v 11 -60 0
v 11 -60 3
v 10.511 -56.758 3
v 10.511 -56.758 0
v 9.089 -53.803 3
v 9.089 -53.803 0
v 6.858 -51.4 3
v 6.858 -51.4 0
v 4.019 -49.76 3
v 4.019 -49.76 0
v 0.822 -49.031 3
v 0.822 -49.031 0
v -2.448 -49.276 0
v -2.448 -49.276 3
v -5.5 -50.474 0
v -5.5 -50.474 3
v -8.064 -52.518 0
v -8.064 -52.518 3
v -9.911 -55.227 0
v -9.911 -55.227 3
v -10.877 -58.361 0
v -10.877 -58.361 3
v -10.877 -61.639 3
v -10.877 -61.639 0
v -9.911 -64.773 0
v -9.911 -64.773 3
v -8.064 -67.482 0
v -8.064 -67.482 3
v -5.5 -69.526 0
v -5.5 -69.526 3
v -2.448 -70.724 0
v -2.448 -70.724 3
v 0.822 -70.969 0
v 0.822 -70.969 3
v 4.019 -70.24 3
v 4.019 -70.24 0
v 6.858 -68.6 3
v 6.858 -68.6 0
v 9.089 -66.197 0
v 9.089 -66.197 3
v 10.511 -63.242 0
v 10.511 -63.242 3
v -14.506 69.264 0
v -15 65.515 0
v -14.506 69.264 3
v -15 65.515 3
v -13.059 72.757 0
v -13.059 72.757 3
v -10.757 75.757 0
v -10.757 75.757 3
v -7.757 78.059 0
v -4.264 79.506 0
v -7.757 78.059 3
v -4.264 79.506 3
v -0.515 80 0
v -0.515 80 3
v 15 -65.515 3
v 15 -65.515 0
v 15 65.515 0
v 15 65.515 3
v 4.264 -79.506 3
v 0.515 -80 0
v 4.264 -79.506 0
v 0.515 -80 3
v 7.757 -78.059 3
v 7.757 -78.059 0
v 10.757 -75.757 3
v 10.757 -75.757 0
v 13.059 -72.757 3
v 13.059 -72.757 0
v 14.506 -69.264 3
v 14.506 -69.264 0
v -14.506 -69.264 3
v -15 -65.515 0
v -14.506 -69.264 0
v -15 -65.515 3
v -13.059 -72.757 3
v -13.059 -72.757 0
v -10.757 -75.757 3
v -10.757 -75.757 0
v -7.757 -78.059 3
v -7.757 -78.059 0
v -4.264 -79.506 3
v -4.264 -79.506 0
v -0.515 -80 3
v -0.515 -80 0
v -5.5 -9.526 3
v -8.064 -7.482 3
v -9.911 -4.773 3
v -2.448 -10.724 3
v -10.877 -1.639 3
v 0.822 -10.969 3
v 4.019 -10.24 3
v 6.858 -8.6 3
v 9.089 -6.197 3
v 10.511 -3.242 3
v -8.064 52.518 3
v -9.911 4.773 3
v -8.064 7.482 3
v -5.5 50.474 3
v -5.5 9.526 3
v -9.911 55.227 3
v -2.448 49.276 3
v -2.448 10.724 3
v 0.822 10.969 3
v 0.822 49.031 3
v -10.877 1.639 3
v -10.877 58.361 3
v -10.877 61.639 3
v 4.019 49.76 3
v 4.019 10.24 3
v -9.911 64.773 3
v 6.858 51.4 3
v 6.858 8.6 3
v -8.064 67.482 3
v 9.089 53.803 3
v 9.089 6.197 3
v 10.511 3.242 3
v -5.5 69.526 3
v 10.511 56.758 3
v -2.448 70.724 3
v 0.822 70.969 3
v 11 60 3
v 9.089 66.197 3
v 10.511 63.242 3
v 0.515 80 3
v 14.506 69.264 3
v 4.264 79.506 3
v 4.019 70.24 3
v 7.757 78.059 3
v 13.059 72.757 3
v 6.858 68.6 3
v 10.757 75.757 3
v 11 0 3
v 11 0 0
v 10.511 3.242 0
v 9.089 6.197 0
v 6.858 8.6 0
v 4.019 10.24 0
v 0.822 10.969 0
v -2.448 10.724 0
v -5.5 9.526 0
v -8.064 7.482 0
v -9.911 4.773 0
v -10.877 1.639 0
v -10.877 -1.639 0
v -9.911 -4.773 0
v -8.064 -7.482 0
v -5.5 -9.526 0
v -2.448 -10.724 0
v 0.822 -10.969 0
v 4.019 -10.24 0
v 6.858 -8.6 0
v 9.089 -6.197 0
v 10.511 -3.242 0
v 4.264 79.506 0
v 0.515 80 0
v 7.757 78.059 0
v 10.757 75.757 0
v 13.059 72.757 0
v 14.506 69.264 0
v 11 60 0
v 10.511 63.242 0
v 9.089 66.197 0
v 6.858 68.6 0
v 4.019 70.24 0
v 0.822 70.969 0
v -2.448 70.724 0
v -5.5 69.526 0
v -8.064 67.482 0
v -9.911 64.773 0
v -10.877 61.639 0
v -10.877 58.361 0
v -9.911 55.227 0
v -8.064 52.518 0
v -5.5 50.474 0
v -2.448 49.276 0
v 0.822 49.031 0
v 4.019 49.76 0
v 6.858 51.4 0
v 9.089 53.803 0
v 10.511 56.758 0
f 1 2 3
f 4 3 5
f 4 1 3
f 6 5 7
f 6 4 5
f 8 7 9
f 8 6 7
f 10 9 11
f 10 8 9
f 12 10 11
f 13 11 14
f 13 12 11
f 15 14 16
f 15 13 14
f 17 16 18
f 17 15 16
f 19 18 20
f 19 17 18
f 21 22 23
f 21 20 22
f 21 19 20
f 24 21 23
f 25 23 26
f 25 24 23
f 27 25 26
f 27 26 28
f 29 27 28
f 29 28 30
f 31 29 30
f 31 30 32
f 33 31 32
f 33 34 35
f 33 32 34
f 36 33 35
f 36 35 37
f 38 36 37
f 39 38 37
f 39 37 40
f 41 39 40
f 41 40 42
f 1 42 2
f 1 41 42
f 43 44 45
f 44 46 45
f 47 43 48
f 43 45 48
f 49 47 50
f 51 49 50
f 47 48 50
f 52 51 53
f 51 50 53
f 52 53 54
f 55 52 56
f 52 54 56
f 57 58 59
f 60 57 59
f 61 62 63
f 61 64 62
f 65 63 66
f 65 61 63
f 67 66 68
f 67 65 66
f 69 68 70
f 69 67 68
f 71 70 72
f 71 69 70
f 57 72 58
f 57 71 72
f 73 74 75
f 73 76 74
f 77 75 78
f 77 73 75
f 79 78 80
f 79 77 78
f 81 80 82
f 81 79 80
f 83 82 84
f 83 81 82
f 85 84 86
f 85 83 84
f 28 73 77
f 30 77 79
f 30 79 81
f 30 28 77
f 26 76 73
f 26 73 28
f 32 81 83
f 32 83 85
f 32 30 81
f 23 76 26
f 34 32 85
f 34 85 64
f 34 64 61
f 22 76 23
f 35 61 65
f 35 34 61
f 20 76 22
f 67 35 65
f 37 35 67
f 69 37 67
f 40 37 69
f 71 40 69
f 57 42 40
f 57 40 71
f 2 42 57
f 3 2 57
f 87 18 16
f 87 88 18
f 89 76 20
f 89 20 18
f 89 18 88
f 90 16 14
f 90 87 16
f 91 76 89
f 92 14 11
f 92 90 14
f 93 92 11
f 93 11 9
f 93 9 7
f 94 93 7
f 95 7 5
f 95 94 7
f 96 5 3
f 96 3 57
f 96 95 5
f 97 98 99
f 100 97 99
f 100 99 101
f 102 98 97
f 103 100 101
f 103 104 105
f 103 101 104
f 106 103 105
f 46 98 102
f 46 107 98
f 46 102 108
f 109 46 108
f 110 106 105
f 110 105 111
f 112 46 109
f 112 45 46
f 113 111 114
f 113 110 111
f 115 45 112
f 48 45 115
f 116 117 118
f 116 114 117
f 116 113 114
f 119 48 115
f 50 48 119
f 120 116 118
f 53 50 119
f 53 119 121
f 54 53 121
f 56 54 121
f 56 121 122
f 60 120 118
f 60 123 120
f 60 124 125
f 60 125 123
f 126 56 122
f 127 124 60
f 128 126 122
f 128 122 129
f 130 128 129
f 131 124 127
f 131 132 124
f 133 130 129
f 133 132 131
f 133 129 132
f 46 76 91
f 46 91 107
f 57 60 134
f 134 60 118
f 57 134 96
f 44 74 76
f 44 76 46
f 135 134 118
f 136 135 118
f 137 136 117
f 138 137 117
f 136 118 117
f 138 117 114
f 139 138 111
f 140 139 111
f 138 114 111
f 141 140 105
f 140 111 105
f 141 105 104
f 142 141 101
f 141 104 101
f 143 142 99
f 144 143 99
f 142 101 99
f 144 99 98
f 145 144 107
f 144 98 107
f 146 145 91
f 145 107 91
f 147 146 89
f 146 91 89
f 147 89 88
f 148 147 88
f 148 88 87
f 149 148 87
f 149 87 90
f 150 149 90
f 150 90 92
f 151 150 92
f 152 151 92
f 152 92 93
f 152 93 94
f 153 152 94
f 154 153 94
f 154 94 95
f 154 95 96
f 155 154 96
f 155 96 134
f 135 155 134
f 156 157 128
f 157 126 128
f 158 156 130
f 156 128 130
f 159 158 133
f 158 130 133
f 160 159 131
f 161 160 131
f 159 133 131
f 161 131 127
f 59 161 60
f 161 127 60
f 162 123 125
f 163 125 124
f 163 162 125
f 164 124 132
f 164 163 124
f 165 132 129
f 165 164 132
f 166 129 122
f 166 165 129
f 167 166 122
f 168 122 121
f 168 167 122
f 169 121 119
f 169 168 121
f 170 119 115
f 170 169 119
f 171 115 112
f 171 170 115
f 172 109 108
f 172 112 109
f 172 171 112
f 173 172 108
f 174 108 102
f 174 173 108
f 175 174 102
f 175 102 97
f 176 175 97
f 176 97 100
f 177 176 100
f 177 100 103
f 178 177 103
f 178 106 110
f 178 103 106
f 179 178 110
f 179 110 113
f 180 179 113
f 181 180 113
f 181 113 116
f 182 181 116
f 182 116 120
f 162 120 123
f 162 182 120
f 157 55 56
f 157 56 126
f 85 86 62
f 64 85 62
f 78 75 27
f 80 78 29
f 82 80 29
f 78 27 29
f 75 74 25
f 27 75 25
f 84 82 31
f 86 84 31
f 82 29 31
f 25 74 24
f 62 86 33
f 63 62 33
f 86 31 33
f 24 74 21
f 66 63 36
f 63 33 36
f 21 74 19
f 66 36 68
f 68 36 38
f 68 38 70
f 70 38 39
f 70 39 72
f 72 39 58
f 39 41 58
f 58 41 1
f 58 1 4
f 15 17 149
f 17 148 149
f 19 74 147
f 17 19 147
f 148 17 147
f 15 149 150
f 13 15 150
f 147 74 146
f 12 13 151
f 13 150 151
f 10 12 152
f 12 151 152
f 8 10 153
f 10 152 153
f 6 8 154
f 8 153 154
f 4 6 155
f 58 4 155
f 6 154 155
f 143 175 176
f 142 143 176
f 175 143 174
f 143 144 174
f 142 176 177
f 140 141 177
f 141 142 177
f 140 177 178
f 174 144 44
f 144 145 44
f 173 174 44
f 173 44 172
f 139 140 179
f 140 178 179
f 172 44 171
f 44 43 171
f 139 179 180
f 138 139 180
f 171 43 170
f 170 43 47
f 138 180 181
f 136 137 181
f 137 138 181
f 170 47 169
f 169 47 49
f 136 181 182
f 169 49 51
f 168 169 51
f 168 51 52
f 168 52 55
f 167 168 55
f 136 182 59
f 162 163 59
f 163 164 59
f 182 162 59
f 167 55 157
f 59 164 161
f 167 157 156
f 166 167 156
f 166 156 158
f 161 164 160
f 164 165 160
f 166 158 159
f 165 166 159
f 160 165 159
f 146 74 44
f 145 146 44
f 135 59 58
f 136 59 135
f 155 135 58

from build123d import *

# Parameters (mm, degrees)
F0_W     = 30
F0_H     = 160
F1_DEPTH = 3
F2_R     = 11
F3_DEPTH = 25
F4_R     = 11
F5_DEPTH = 25
F6_R     = 14.485281
F7_R     = 14.485281


with BuildPart() as f1:
    # F0 (on Top) → F1 (new body)
    with BuildSketch(Plane.XY):
        Rectangle(F0_W, F0_H)
    extrude(amount=F1_DEPTH)

    # F2 (on face) → F3 (cut)
    with BuildSketch(Plane.XY.offset(3)):
        Circle(F2_R)
    extrude(amount=-F3_DEPTH, mode=Mode.SUBTRACT)

    # F4 (on Top) → F5 (cut)
    with BuildSketch(Plane.XY):
        with Locations((0, 60)):
            Circle(F4_R)
        with Locations((0, -60)):
            Circle(F4_R)
    extrude(amount=F5_DEPTH, mode=Mode.SUBTRACT)

    # F6
    f6_edges = [f1.edges().sort_by_distance(p)[0] for p in [
        (-15, -80, 1.5),
        (15, -80, 1.5),
    ]]
    fillet(f6_edges, radius=F6_R)

    # F7
    f7_edges = [f1.edges().sort_by_distance(p)[0] for p in [
        (-15, 80, 1.5),
        (15, 80, 1.5),
    ]]
    fillet(f7_edges, radius=F7_R)


solid = f1.part
